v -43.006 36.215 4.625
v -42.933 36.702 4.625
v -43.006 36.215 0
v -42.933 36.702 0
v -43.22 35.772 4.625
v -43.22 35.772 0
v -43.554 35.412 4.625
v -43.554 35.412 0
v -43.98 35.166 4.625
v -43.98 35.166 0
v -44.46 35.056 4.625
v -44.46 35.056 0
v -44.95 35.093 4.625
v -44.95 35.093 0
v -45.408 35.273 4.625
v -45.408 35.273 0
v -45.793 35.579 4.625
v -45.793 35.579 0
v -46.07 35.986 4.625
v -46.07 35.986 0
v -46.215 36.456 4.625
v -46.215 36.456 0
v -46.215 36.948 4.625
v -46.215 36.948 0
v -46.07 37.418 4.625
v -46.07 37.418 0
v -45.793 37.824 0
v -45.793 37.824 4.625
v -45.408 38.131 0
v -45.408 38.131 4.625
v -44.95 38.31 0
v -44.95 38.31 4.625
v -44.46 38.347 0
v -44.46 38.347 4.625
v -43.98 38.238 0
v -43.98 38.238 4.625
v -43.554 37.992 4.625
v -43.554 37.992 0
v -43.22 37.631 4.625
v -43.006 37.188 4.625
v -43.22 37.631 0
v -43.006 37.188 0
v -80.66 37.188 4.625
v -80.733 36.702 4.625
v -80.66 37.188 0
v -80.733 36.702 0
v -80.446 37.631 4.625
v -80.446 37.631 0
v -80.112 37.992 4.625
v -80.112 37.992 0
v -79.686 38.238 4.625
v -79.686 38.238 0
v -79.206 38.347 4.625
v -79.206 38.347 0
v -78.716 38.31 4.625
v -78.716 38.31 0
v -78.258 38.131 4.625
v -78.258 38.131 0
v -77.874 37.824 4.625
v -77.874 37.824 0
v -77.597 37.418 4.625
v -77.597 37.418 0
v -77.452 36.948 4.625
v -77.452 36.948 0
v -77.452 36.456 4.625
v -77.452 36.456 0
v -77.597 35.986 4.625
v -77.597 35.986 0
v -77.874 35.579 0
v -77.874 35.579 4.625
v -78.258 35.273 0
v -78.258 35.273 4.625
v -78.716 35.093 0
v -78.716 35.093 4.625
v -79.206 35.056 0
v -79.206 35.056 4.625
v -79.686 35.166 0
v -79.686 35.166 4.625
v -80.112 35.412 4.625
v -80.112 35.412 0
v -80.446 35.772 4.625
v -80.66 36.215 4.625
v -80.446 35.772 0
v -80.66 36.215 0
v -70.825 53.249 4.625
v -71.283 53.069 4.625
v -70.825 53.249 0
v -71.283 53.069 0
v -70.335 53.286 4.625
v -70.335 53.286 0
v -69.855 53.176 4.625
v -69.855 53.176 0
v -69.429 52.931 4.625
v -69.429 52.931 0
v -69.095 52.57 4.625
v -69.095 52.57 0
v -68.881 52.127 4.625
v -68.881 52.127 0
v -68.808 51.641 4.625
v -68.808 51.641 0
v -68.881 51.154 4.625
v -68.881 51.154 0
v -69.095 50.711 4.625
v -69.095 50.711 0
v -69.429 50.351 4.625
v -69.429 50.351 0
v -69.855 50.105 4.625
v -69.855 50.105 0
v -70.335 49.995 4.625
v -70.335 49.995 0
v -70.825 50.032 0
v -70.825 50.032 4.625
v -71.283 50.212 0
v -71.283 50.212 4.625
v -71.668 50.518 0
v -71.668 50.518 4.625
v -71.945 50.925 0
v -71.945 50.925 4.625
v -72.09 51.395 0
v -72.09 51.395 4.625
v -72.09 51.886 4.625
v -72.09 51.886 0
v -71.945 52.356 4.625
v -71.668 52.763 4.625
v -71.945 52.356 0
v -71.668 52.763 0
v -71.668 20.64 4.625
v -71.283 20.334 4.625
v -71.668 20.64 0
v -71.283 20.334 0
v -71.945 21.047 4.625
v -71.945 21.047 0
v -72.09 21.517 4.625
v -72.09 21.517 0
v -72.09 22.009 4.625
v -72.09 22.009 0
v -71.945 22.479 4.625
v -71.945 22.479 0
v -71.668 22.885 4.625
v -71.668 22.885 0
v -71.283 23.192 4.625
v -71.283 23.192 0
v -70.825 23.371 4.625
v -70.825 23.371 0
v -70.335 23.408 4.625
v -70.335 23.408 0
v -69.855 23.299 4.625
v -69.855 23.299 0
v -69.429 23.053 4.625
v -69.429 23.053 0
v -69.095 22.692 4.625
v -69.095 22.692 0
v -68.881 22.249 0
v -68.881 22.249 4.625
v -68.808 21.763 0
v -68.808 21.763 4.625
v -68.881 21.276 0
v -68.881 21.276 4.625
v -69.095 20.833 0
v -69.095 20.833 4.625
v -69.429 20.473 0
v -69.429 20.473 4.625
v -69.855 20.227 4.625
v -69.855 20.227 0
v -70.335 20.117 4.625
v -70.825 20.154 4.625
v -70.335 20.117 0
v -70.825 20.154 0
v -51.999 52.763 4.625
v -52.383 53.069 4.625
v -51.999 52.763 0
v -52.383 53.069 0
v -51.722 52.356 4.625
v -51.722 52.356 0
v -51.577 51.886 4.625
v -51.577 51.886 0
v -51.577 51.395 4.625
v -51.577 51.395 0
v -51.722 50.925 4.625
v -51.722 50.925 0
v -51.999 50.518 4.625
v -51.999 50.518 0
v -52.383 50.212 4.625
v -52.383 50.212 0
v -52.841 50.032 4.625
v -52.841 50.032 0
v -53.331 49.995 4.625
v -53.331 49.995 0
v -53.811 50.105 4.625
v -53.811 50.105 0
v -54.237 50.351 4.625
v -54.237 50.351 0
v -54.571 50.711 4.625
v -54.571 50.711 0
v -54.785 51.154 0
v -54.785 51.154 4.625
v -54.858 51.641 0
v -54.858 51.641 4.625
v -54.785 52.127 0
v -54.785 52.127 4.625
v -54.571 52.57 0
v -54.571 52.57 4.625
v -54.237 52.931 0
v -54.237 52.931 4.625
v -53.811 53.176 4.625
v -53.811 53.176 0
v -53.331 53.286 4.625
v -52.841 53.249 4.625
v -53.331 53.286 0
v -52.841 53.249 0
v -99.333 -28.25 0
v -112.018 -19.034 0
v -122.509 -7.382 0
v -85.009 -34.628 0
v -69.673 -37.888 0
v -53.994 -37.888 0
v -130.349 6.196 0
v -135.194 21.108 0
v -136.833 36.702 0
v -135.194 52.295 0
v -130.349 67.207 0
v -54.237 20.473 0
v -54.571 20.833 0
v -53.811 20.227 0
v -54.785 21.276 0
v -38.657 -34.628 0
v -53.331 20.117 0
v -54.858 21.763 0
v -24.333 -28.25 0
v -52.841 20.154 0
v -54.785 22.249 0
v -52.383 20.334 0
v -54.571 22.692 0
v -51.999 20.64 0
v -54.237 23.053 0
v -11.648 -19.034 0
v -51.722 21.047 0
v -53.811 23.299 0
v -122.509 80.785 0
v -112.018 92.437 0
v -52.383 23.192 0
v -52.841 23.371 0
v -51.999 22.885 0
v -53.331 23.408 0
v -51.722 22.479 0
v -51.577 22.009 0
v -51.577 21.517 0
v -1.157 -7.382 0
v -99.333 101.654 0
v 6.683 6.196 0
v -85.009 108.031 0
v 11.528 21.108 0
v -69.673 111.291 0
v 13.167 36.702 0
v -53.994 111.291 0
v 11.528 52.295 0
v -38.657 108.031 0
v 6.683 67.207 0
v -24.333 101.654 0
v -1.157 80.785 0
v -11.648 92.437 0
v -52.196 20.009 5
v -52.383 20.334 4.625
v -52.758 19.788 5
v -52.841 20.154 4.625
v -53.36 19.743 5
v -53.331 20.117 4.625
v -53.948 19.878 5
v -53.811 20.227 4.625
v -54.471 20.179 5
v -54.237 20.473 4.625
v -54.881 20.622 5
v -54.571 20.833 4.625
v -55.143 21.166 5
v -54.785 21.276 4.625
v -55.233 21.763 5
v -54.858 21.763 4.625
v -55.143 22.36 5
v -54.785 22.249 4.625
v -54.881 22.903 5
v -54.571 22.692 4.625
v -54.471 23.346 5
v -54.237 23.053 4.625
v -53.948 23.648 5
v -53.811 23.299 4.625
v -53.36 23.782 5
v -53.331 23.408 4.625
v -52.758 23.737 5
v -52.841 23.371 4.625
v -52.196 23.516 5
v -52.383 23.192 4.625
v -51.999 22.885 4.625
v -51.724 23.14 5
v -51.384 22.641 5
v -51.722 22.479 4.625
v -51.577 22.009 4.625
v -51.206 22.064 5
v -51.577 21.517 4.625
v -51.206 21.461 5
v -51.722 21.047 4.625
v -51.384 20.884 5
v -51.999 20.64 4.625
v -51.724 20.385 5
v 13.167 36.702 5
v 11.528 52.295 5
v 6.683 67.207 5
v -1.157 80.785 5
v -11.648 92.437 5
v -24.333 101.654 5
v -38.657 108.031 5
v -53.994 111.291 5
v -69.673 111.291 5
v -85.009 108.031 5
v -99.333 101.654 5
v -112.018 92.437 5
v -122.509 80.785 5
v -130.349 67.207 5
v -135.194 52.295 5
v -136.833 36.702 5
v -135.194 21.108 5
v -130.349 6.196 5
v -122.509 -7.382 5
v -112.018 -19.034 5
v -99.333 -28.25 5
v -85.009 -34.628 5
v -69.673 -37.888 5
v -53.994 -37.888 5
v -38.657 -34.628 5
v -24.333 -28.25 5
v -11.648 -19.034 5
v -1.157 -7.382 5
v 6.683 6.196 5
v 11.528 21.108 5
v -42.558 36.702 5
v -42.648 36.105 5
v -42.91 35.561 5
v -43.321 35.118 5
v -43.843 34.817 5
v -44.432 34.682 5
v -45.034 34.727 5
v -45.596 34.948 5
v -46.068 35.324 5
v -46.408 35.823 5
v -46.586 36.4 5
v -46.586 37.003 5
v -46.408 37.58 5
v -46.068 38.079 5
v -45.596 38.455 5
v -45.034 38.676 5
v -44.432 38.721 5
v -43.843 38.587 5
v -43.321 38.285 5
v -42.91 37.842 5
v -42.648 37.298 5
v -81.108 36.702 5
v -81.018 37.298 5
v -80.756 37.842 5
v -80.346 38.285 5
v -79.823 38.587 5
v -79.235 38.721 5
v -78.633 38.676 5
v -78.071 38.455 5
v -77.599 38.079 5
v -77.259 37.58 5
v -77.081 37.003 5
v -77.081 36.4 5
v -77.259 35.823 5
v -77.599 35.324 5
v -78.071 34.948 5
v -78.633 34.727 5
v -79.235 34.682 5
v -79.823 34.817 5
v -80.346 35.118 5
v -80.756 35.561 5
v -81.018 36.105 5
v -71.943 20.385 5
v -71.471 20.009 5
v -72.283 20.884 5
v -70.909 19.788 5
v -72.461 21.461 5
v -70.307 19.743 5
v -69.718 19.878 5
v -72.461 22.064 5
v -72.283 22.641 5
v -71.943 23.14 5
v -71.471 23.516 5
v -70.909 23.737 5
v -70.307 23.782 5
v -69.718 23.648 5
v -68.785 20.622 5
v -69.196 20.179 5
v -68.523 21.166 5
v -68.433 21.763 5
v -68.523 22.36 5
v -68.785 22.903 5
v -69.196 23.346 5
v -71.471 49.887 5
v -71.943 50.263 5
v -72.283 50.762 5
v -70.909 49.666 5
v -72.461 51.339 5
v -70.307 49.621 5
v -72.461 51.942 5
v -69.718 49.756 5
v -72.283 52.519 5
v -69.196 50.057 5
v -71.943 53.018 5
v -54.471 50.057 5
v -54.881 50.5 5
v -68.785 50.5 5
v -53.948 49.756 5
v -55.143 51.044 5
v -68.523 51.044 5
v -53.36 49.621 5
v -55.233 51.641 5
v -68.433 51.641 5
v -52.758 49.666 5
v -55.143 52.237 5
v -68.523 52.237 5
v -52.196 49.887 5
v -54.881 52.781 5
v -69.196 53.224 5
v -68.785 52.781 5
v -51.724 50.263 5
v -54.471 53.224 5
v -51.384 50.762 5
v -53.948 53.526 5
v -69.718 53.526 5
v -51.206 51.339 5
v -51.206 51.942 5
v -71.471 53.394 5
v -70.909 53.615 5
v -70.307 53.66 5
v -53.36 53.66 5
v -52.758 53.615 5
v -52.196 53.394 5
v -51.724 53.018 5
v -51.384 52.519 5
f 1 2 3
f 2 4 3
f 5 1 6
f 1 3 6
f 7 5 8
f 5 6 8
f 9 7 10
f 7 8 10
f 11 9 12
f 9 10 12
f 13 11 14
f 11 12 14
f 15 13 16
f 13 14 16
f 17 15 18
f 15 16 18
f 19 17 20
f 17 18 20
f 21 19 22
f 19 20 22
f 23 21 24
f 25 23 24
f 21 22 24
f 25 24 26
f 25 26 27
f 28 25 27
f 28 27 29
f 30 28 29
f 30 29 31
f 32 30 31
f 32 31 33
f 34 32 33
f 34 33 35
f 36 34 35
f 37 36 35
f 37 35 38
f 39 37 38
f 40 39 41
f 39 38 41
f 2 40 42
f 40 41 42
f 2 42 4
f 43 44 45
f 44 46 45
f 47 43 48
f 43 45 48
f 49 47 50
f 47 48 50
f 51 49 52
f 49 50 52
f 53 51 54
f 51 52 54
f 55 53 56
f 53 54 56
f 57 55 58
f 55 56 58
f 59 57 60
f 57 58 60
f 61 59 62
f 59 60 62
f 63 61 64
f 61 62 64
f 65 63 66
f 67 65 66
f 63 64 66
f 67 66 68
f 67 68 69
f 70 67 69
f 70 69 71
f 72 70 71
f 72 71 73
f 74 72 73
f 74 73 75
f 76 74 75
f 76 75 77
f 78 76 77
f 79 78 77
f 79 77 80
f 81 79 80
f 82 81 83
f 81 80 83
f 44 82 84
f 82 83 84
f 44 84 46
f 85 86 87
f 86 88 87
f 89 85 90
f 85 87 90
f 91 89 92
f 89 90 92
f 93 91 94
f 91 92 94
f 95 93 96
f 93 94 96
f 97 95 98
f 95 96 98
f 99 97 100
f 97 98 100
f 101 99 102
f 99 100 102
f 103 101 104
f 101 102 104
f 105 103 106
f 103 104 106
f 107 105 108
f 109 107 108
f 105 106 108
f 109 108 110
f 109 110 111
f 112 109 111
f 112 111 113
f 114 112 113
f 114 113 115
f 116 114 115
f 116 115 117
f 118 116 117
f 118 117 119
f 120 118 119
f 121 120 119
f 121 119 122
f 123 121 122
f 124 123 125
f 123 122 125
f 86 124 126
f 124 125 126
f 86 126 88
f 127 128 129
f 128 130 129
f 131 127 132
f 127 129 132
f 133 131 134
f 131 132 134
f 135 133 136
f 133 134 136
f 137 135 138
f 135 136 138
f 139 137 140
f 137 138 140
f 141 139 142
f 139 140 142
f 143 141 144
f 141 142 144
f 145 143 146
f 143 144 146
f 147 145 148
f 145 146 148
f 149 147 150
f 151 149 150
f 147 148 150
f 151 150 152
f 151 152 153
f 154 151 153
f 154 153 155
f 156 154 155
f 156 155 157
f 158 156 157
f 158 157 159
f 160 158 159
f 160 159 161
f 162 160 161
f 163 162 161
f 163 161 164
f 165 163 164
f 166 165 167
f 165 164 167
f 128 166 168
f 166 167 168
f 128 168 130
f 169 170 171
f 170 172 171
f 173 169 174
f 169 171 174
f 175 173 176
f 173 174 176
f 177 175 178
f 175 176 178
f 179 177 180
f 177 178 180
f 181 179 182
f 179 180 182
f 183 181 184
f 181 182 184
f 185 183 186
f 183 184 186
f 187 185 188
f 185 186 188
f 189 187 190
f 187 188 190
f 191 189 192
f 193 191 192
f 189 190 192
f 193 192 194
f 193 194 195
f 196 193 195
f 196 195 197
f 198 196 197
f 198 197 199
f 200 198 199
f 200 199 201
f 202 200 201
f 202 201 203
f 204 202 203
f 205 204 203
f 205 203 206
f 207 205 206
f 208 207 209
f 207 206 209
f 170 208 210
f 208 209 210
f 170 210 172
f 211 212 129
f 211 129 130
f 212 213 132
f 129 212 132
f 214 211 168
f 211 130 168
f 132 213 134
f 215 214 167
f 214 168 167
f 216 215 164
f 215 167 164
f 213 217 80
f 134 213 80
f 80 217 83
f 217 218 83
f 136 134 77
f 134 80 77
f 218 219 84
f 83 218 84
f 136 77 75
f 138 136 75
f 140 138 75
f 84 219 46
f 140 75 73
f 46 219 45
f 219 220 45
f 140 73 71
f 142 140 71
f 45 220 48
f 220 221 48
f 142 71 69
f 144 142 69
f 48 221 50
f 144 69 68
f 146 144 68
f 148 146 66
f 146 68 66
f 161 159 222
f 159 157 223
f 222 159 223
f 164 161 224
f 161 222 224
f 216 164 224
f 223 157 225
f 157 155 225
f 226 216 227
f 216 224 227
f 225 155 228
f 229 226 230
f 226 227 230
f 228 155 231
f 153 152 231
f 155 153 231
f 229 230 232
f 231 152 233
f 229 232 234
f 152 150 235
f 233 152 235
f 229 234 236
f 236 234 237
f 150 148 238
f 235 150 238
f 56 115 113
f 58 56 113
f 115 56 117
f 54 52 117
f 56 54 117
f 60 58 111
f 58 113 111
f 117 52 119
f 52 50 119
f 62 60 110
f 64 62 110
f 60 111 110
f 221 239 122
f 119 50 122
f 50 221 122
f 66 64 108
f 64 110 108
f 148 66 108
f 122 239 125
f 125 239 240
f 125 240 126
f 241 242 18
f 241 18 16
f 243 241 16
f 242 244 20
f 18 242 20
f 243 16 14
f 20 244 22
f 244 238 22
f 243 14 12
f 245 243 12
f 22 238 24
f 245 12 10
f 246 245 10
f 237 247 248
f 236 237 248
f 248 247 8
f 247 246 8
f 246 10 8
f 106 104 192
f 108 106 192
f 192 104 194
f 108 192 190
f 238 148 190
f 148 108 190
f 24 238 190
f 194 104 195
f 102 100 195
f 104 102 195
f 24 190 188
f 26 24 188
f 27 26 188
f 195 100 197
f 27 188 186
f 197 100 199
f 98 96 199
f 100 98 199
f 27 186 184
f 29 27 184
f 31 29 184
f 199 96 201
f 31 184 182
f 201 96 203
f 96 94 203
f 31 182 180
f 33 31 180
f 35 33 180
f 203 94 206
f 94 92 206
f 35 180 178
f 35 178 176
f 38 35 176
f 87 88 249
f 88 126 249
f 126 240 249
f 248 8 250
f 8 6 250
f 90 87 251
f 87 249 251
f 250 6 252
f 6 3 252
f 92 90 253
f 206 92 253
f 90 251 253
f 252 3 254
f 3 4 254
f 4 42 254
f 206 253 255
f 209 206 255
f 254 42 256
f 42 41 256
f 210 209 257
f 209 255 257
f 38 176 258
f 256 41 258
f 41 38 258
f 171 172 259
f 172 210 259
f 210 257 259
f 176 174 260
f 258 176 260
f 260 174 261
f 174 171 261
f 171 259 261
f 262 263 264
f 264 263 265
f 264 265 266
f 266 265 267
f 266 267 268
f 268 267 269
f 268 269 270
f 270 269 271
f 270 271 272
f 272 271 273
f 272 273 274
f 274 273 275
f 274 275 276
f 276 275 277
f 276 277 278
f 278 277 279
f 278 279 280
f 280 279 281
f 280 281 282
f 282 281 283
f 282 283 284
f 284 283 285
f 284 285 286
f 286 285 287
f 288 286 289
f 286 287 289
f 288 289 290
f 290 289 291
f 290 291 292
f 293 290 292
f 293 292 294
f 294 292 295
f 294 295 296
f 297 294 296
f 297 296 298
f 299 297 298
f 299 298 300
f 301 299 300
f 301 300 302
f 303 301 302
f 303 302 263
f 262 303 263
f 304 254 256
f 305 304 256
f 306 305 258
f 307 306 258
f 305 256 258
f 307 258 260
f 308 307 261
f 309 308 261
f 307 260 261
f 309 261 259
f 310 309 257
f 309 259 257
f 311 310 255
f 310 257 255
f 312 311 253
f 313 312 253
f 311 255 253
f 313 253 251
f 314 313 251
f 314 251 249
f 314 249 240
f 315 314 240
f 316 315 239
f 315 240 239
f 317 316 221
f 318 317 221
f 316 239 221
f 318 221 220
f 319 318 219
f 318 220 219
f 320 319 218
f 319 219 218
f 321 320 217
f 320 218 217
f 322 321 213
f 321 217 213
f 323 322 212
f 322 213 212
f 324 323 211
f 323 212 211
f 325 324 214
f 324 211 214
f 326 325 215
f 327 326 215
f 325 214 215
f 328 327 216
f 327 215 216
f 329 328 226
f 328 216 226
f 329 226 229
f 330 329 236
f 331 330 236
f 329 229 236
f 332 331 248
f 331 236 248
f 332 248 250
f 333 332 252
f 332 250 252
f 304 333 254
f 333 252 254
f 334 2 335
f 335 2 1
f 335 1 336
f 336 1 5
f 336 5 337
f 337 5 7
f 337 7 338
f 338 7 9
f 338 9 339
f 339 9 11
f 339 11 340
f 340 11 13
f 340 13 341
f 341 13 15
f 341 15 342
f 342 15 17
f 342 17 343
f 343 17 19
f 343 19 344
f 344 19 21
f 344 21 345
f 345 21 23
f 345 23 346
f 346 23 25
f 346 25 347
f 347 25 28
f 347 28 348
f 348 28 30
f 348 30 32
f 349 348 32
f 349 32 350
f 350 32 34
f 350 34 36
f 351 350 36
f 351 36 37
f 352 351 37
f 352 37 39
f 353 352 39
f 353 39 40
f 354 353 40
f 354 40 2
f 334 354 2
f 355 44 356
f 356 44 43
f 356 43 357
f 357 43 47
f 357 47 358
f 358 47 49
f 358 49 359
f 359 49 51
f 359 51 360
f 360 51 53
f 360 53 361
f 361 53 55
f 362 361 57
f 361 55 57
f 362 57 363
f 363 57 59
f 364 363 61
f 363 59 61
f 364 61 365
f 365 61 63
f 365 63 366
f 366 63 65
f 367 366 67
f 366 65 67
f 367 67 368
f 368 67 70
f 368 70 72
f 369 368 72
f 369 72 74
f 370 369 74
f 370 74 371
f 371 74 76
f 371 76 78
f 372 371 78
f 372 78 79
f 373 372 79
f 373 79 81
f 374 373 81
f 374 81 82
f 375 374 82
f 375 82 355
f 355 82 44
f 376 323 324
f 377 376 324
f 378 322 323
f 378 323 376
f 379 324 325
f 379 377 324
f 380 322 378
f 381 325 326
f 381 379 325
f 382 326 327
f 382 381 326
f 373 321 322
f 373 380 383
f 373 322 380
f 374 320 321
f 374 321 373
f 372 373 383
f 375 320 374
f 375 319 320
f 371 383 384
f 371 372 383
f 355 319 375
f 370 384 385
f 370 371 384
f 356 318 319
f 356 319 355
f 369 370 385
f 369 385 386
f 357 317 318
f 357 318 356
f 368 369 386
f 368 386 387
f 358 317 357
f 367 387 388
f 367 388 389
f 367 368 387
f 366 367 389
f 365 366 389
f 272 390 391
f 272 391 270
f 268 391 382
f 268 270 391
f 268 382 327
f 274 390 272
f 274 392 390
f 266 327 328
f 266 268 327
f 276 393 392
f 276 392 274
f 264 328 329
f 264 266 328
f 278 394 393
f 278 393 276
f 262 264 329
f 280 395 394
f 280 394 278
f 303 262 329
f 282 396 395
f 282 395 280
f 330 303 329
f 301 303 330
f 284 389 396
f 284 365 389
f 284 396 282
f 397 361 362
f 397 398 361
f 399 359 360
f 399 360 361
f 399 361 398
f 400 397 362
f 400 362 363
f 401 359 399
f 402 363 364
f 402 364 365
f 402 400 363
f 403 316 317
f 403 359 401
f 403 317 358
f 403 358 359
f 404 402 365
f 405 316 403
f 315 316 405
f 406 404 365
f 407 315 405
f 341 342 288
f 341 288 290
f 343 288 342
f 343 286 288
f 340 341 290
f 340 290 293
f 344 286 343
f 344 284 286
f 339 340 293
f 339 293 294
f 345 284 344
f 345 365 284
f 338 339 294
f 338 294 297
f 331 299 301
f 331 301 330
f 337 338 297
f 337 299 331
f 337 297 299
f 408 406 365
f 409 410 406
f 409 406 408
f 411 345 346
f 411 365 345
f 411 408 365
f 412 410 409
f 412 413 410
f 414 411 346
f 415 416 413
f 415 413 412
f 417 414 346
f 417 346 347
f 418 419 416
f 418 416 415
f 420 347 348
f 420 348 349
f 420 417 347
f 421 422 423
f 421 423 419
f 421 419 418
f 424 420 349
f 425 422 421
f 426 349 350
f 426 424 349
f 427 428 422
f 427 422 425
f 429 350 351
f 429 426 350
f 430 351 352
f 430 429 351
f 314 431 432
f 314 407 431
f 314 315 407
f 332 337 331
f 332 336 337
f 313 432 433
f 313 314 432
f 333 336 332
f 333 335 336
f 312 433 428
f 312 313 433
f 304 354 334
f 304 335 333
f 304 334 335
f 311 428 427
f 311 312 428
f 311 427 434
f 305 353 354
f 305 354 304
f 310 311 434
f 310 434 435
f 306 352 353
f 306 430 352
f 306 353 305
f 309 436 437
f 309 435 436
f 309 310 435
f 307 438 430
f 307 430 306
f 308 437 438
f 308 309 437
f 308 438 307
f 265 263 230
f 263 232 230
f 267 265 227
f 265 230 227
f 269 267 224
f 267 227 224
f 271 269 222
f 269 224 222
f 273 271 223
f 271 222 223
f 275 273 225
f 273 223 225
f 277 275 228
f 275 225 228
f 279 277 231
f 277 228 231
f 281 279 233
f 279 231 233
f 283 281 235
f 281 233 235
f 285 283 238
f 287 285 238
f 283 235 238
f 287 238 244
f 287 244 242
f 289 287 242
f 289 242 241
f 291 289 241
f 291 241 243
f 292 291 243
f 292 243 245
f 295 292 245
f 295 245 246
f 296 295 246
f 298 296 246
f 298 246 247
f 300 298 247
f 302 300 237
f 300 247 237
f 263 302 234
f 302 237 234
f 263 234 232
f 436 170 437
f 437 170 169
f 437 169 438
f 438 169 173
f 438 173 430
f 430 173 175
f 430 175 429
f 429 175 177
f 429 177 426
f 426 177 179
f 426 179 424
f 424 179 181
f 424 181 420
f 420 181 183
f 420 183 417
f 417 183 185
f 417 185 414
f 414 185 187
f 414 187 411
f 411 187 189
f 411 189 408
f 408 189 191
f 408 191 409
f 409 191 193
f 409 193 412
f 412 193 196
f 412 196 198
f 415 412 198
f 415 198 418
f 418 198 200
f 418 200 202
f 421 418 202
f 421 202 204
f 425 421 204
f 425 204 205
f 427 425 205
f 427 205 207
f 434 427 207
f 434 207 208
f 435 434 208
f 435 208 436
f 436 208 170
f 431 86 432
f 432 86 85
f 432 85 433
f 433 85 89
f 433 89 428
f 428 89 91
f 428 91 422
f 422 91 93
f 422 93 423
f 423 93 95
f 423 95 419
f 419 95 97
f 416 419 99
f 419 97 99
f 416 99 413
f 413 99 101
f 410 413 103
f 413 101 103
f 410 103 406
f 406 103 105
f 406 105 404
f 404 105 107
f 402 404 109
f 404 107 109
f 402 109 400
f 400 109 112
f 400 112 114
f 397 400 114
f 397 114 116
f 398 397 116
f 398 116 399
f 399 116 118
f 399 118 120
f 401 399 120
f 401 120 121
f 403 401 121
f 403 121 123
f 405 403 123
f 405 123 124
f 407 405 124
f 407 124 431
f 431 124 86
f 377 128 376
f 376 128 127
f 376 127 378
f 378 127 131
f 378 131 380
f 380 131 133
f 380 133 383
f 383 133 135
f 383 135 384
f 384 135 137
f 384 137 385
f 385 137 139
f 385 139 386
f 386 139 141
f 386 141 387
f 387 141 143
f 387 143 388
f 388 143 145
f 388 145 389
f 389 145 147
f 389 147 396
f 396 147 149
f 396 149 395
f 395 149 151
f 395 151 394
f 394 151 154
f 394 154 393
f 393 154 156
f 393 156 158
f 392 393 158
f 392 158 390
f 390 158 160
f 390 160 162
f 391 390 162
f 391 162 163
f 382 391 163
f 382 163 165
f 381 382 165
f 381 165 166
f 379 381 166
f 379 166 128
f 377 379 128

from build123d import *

# Parameters (mm, degrees)
SKETCH_1_R                   = 75
SKETCH_1_R_2                 = 17.25
EXTRUDE_1_DEPTH              = 5
EXTRUDE_START                = -5
SKETCH_2_R                   = 17.25
EXTRUDE_2_DEPTH              = 5
HOLE_WIZARD_M4_5_D           = 3.3
HOLE_WIZARD_M4_5_CSINK_D     = 4.05
HOLE_WIZARD_M4_5_CSINK_ANGLE = 90
PATTERN_CIRCULAR_1_COUNT     = 6


with BuildPart() as part:
    # 草图1 → 凸台-拉伸1 (new body)
    with BuildSketch(Plane.XY):
        with Locations((-61.833180774, 36.701596564)):
            Circle(SKETCH_1_R)
        with Locations((-61.833180774, 36.701596564)):
            Circle(SKETCH_1_R_2, mode=Mode.SUBTRACT)
    extrude(amount=EXTRUDE_1_DEPTH)

    # 草图2 → 凸台-拉伸2 (add)
    with BuildSketch(Plane.XY.offset(5).offset(EXTRUDE_START)):
        with Locations((-61.833180774, 36.701596564)):
            Circle(SKETCH_2_R)
    extrude(amount=EXTRUDE_2_DEPTH)

    # M4 螺纹孔5 (through all)
    with Locations(Plane.XY.offset(5)):
        with Locations((-79.083180774, 36.701596564)):
            hole_wizard_m4_5 = CounterSinkHole(HOLE_WIZARD_M4_5_D / 2, HOLE_WIZARD_M4_5_CSINK_D / 2, counter_sink_angle=HOLE_WIZARD_M4_5_CSINK_ANGLE)

    # 阵列(圆周)1: M4 螺纹孔5 ×6 about axis
    pattern_circular_1_axis = Axis((-61.833180774, 36.701596564, 0), (0, 0, 1))
    for i in range(1, PATTERN_CIRCULAR_1_COUNT):
        add(hole_wizard_m4_5.rotate(pattern_circular_1_axis, i * 360 / PATTERN_CIRCULAR_1_COUNT), mode=Mode.SUBTRACT)


solid = part.part
